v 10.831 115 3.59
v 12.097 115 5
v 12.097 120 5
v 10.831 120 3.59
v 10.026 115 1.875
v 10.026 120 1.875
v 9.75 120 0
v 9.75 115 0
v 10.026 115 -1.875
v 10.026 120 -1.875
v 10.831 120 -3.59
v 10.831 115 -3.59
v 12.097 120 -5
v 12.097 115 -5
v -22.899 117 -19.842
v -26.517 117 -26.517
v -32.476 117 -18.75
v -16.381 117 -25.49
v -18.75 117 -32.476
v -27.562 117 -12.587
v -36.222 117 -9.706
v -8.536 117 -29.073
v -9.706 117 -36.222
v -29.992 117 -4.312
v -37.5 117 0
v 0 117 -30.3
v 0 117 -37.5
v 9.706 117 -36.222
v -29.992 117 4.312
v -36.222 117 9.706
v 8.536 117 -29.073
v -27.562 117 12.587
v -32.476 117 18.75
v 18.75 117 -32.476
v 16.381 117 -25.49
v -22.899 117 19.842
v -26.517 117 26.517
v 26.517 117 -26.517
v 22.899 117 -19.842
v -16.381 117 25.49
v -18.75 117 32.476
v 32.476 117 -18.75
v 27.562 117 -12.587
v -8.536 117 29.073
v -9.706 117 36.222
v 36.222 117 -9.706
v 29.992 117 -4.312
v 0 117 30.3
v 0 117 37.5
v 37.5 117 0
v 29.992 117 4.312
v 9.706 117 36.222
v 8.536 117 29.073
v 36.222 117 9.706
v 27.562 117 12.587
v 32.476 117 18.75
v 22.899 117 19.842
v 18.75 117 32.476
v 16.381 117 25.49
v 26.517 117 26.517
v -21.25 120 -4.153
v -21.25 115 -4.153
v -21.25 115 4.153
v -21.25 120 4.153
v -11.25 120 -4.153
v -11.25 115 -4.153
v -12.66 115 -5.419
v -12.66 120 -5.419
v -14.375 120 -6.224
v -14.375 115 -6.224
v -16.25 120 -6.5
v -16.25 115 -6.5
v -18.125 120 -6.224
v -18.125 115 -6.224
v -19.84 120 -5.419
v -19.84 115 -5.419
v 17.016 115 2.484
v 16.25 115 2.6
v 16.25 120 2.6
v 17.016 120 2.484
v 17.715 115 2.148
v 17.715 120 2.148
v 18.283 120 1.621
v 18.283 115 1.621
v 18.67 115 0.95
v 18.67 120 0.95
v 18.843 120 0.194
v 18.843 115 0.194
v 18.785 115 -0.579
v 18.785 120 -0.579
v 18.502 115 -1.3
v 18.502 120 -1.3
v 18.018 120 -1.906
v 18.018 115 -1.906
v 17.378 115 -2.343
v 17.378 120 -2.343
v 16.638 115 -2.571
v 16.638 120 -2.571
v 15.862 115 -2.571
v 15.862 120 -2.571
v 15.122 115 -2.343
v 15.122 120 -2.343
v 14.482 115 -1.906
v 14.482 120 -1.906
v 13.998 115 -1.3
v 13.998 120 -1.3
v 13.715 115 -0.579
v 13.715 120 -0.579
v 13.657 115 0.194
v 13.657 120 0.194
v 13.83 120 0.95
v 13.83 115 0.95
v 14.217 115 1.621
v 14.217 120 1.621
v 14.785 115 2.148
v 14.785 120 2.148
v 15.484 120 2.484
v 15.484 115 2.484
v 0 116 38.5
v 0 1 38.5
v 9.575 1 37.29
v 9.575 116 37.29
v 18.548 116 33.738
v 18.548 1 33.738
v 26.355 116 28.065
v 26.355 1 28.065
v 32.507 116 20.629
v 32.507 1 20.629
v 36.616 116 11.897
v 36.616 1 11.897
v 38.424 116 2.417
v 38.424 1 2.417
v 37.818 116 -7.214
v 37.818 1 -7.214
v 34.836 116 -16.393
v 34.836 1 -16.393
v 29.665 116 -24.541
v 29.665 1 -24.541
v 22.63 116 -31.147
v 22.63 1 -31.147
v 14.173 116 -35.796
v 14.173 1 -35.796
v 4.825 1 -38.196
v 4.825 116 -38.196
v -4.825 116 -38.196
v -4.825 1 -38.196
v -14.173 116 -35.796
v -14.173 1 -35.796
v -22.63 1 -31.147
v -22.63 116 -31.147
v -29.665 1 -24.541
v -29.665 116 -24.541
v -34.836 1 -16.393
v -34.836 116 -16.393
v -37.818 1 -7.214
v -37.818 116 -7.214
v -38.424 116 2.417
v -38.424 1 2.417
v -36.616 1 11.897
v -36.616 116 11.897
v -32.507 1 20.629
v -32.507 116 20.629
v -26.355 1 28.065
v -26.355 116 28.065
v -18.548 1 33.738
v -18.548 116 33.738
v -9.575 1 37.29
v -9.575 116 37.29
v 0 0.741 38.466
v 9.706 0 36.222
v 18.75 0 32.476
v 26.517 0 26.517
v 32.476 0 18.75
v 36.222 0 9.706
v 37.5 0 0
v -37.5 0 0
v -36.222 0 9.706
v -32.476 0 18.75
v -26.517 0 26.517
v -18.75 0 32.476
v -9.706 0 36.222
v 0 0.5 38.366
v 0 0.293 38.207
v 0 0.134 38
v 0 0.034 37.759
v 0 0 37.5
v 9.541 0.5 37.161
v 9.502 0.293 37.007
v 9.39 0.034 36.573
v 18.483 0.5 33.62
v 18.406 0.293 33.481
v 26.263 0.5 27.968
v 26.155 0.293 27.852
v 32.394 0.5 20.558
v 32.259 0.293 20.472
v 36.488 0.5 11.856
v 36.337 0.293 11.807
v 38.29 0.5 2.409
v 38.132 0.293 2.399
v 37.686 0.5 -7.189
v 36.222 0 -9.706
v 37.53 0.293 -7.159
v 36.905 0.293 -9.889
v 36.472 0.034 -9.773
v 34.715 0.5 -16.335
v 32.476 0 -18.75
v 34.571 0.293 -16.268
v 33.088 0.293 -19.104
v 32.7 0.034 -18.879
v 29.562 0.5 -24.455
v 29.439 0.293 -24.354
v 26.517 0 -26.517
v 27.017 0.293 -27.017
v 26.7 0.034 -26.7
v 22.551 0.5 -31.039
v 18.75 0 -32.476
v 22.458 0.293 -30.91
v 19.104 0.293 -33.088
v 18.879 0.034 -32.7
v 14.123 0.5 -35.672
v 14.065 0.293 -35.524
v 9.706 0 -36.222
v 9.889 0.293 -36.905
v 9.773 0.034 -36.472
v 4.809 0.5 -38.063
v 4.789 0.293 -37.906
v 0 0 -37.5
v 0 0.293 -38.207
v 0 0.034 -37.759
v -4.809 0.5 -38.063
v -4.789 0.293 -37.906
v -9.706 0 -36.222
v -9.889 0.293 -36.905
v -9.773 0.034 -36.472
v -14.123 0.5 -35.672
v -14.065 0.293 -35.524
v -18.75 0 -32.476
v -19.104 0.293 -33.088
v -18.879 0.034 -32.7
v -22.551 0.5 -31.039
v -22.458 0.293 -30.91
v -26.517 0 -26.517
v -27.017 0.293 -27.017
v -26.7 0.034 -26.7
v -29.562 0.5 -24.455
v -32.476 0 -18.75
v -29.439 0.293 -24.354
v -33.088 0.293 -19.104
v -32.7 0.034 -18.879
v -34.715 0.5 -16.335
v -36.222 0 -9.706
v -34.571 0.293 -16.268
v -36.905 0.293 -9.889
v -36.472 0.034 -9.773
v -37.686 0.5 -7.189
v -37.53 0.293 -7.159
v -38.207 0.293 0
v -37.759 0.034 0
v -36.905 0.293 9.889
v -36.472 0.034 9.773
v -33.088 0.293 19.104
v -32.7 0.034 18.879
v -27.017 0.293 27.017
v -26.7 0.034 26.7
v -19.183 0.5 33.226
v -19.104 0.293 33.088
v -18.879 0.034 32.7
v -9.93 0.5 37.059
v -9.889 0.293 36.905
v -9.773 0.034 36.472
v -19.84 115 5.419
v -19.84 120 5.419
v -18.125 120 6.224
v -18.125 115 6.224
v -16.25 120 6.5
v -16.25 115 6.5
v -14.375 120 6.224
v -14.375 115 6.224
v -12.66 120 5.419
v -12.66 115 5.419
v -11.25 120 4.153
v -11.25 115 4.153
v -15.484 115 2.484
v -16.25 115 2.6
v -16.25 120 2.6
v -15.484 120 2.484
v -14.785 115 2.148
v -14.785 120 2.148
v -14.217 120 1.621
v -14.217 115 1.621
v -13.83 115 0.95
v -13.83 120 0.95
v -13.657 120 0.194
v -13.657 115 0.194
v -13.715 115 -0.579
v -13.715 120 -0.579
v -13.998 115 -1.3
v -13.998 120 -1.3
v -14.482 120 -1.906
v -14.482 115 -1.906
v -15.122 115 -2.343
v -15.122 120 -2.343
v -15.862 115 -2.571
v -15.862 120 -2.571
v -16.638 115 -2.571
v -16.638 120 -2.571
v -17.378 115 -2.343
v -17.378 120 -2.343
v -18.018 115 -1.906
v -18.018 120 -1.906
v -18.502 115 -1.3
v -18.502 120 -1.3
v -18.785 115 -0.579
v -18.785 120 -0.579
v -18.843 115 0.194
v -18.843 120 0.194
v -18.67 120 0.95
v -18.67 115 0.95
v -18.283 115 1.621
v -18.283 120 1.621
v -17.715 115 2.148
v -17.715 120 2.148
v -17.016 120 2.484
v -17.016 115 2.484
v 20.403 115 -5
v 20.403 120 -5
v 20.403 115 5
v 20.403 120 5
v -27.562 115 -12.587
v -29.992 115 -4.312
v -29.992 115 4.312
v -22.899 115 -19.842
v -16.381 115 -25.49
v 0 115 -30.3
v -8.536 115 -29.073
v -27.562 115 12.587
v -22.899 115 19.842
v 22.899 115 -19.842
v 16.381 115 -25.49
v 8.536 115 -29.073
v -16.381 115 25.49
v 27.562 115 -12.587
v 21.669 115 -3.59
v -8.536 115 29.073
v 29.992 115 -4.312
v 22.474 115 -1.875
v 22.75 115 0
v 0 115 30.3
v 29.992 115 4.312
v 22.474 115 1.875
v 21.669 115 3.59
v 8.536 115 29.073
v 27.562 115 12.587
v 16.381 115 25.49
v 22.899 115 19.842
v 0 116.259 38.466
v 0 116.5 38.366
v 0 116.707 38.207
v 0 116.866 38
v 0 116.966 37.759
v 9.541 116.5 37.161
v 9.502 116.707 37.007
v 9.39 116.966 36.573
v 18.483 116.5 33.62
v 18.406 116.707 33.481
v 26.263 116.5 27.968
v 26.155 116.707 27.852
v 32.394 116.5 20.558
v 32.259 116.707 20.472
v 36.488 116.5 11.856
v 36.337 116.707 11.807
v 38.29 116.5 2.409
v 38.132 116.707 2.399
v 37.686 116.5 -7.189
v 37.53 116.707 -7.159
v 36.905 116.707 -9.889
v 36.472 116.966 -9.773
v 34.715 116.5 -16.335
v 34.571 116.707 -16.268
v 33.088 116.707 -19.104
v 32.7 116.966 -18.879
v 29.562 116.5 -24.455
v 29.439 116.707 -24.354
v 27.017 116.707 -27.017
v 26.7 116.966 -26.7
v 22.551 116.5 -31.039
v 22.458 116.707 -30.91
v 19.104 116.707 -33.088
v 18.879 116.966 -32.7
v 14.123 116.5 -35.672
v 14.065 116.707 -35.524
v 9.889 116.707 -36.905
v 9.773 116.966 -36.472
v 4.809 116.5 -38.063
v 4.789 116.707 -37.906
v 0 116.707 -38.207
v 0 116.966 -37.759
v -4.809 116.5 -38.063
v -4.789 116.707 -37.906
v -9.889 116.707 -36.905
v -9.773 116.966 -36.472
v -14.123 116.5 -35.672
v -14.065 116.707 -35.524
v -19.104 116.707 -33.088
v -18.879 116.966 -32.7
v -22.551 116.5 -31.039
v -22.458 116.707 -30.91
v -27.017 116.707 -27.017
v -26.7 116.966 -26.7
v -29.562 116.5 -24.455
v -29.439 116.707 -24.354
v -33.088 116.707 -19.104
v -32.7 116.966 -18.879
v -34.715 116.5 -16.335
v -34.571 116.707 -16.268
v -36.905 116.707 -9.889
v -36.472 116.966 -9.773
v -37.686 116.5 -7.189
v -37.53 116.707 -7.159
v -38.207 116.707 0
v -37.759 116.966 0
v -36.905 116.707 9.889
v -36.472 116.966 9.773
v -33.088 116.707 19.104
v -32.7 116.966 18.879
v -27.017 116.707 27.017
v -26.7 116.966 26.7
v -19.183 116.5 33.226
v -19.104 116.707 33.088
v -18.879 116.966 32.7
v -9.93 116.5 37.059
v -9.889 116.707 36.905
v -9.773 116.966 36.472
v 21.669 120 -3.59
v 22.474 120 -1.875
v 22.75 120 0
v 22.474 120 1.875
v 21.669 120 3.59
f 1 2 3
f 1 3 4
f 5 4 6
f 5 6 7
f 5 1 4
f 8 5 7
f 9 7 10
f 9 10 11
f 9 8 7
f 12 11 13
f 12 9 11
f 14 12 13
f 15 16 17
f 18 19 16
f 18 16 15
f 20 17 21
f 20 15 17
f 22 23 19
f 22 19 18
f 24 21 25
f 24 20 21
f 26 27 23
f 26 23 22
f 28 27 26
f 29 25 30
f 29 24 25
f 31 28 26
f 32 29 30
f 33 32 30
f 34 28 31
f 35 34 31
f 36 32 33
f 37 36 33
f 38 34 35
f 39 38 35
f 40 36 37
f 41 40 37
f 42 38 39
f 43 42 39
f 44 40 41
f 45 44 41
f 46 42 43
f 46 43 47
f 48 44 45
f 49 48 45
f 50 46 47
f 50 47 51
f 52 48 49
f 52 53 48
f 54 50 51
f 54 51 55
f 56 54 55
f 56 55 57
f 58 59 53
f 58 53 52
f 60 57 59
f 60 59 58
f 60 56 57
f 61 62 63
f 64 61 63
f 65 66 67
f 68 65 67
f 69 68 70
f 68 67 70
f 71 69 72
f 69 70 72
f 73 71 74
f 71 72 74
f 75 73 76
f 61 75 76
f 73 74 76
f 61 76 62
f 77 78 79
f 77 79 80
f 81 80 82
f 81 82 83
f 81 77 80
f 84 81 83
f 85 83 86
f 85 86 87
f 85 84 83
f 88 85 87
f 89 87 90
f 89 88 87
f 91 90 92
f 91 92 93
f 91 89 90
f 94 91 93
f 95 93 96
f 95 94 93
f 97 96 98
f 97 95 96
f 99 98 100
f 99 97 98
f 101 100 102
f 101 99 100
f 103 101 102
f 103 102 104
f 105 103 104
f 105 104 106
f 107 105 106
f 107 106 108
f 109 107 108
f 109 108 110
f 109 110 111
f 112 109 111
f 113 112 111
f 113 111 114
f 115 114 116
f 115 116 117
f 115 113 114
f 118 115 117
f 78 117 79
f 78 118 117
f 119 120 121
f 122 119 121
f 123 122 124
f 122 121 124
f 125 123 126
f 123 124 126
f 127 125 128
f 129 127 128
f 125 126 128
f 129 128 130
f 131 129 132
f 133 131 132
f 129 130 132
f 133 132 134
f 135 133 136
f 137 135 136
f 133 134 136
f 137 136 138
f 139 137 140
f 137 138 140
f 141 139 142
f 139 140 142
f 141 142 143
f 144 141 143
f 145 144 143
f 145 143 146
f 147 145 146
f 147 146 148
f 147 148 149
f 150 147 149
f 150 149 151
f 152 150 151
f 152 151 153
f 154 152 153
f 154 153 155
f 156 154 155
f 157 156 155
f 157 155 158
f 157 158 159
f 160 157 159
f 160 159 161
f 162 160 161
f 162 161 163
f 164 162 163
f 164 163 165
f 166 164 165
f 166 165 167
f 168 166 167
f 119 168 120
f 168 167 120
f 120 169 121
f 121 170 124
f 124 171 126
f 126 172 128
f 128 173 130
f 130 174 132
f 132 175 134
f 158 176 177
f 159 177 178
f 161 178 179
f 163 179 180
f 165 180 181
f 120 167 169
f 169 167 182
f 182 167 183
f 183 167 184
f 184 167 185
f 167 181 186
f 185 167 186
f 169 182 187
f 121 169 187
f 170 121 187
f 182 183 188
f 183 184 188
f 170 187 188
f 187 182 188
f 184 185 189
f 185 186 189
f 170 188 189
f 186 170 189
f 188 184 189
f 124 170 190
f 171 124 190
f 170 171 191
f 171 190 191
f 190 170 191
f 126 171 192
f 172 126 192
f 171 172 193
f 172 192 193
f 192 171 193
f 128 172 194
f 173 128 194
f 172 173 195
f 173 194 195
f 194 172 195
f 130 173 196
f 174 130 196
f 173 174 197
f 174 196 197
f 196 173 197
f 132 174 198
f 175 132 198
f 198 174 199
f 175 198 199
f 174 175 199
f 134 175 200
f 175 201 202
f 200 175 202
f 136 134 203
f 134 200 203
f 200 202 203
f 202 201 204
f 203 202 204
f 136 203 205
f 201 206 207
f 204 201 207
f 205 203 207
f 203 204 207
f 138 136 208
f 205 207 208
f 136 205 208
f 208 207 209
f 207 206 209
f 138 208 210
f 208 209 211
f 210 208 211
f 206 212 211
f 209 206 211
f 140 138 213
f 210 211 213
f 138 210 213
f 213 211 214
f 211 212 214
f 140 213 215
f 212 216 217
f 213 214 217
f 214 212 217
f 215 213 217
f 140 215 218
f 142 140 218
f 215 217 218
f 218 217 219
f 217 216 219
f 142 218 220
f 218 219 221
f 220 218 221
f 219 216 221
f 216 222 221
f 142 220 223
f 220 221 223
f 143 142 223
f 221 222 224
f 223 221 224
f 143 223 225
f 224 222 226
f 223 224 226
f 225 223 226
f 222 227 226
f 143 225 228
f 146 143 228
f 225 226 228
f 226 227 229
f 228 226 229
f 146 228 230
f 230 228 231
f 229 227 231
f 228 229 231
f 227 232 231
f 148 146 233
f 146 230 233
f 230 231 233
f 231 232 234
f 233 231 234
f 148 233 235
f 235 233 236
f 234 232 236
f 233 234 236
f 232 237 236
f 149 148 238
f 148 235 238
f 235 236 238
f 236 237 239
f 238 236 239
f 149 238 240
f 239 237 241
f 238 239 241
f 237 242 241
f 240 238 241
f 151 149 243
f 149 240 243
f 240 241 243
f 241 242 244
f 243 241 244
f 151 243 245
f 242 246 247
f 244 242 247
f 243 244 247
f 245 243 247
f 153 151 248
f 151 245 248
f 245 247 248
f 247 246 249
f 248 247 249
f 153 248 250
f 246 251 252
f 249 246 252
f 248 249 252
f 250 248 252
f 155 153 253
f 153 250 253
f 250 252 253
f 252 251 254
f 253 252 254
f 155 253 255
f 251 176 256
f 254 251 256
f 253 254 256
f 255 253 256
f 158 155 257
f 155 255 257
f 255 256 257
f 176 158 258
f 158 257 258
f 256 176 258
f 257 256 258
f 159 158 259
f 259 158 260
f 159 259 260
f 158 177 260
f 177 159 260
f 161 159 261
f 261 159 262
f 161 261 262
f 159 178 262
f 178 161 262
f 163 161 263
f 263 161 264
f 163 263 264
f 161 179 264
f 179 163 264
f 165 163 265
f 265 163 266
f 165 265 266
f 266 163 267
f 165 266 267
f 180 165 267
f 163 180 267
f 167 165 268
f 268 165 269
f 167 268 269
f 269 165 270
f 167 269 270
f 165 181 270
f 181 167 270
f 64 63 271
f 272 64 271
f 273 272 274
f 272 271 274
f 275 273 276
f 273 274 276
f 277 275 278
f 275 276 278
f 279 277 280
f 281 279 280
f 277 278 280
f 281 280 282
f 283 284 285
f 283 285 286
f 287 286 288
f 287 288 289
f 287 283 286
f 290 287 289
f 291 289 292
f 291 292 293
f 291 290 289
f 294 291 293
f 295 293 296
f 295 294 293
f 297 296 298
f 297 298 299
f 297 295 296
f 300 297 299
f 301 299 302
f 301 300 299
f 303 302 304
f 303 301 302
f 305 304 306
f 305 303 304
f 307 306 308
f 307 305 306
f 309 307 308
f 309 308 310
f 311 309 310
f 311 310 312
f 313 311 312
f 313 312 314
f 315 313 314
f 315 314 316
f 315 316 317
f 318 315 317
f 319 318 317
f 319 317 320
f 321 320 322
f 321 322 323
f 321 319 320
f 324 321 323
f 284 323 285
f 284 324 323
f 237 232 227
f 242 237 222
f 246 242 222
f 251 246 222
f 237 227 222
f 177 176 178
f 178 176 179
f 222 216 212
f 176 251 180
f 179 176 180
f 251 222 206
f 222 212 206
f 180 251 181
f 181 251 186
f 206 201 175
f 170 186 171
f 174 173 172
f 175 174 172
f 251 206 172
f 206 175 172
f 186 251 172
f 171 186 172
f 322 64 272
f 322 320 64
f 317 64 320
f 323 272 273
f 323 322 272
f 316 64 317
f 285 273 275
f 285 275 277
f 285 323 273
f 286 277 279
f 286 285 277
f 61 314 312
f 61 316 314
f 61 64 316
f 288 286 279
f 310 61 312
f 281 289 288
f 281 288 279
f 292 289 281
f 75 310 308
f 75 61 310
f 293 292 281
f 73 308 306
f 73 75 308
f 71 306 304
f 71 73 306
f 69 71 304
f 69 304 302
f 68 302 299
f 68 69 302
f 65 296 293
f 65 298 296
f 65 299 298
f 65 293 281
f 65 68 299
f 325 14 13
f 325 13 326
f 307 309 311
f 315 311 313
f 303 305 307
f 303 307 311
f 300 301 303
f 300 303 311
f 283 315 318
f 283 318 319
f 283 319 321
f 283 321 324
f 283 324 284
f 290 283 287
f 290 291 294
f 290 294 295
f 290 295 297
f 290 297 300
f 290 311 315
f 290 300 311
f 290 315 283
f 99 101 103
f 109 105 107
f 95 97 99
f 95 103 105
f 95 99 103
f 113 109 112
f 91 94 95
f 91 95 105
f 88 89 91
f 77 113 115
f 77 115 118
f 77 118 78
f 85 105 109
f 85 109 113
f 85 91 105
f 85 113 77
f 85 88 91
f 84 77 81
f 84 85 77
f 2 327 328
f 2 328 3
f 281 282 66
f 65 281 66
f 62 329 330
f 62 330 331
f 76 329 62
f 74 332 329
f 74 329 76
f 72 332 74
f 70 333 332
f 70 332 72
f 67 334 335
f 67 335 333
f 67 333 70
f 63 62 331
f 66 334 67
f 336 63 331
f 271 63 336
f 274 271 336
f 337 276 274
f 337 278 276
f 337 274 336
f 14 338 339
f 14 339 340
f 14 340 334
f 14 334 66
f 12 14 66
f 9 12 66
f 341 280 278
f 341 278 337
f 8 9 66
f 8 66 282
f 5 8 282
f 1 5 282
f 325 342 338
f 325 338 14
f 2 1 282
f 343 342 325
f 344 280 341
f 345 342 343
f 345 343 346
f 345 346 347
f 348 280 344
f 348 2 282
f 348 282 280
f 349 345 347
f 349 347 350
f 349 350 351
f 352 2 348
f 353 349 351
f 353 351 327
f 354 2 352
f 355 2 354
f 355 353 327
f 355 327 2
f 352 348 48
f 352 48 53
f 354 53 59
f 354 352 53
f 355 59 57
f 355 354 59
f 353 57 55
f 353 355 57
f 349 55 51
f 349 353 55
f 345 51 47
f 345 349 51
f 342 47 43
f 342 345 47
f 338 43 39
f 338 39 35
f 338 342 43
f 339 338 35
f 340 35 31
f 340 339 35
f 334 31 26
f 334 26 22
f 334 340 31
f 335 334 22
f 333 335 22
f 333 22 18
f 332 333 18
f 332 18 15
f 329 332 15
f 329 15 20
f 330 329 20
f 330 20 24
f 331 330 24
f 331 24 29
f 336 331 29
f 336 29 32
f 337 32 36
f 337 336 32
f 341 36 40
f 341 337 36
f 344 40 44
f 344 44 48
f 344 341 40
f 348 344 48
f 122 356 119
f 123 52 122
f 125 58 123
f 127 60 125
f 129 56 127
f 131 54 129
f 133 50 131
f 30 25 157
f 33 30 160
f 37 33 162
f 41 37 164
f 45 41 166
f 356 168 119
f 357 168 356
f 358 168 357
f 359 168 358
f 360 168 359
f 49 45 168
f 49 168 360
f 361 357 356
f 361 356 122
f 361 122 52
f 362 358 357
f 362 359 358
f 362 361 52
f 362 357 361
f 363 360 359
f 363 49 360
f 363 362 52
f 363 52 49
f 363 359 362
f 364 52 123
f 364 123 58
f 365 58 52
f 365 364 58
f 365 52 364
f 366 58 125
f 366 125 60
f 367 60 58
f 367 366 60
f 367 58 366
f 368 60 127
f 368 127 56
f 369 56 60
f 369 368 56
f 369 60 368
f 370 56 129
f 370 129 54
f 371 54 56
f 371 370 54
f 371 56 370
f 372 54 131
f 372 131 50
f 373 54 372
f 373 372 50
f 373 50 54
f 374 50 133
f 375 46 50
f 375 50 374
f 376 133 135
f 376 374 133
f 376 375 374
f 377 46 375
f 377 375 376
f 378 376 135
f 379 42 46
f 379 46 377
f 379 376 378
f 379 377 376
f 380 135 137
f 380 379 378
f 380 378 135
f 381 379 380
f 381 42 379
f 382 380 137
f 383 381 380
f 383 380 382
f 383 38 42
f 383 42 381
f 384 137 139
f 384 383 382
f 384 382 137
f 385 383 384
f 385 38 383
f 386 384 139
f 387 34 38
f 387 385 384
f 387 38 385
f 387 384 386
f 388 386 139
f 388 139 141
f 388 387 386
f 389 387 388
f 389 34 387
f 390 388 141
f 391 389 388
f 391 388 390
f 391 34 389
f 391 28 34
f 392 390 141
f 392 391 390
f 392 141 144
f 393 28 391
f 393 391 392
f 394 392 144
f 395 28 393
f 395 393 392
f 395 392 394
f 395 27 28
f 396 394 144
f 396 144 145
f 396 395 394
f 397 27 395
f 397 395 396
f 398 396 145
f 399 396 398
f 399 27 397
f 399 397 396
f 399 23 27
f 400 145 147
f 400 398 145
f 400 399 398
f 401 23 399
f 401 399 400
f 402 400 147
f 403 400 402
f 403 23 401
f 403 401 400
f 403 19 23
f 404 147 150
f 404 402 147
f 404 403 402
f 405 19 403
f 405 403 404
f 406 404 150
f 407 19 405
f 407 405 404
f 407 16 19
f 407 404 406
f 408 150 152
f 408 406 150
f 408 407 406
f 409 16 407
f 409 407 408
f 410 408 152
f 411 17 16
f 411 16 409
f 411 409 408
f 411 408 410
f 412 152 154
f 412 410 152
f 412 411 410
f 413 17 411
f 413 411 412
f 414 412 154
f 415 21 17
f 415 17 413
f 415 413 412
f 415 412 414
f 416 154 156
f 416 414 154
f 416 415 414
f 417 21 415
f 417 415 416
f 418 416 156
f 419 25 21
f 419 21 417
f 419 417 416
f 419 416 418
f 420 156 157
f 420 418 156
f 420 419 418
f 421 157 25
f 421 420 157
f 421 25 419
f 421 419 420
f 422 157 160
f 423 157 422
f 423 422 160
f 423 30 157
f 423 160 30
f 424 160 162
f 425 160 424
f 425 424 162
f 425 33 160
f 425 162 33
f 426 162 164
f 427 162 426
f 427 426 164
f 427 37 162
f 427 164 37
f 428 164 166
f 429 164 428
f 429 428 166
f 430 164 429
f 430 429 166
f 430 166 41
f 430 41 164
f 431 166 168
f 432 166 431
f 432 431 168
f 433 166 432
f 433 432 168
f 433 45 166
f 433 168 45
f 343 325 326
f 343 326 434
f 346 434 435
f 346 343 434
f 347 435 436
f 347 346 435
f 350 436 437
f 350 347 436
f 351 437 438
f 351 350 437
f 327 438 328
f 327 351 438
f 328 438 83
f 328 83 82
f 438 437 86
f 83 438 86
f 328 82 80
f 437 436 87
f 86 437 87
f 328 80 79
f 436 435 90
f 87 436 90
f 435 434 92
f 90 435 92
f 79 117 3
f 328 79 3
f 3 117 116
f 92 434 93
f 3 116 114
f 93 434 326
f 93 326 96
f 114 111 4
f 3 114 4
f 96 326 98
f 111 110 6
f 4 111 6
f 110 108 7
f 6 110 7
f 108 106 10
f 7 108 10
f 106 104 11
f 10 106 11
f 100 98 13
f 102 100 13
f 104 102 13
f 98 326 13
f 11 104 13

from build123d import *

# Parameters (mm, degrees)
SKETCH1_R           = 38.5
BOSS_EXTRUDE1_DEPTH = 115
SKETCH2_R           = 2.6
BOSS_EXTRUDE2_DEPTH = 5
SKETCH3_R           = 38.5
SKETCH3_R_2         = 30.3
BOSS_EXTRUDE3_DEPTH = 2
FILLET1_R           = 1


with BuildPart() as part:
    # Sketch1 → Boss-Extrude1 (new body)
    with BuildSketch(Plane(origin=(0, 0, 0), x_dir=(1, 0, 0), z_dir=(0, 1, 0))):
        with Locations(Location((0, 0, 0), (0, 0, 270))):
            Circle(SKETCH1_R)
    extrude(amount=BOSS_EXTRUDE1_DEPTH)

    # Sketch2 → Boss-Extrude2 (add)
    # profile 1 of 2: a face of its own
    with BuildSketch(Plane(origin=(0, 115, 0), x_dir=(1, 0, 0), z_dir=(0, 1, 0))):
        with BuildLine():
            Line((-21.25, 4.153311931), (-21.25, -4.153311931))
            ThreePointArc((-21.25, -4.153311931), (-16.25, -6.5), (-11.25, -4.153311931))
            Line((-11.25, -4.153311931), (-11.25, 4.153311931))
            ThreePointArc((-11.25, 4.153311931), (-16.25, 6.5), (-21.25, 4.153311931))
        make_face()
        with Locations(Location((-16.25, 0, 0), (0, 0, 270))):
            Circle(SKETCH2_R, mode=Mode.SUBTRACT)
    # profile 2 of 2: a face of its own
    with BuildSketch(Plane(origin=(0, 115, 0), x_dir=(1, 0, 0), z_dir=(0, 1, 0))):
        with BuildLine():
            Line((12.096688069, 5), (20.403311931, 5))
            ThreePointArc((20.403311931, 5), (22.75, 0), (20.403311931, -5))
            Line((20.403311931, -5), (12.096688069, -5))
            ThreePointArc((12.096688069, -5), (9.75, 0), (12.096688069, 5))
        make_face()
        with Locations(Location((16.25, 0, 0), (0, 0, 270))):
            Circle(SKETCH2_R, mode=Mode.SUBTRACT)
    extrude(amount=BOSS_EXTRUDE2_DEPTH)

    # Sketch3 → Boss-Extrude3 (add)
    with BuildSketch(Plane(origin=(0, 115, 0), x_dir=(1, 0, 0), z_dir=(0, 1, 0))):
        with Locations(Location((0, 0, 0), (0, 0, 270))):
            Circle(SKETCH3_R)
        with Locations(Location((0, 0, 0), (0, 0, 270))):
            Circle(SKETCH3_R_2, mode=Mode.SUBTRACT)
    extrude(amount=BOSS_EXTRUDE3_DEPTH)

    # Fillet1
    fillet1_edges = [part.edges().sort_by_distance(p)[0] for p in [
        (0, 0, -38.5),
        (0, 117, -38.5),
    ]]
    fillet(fillet1_edges, radius=FILLET1_R)


solid = part.part
